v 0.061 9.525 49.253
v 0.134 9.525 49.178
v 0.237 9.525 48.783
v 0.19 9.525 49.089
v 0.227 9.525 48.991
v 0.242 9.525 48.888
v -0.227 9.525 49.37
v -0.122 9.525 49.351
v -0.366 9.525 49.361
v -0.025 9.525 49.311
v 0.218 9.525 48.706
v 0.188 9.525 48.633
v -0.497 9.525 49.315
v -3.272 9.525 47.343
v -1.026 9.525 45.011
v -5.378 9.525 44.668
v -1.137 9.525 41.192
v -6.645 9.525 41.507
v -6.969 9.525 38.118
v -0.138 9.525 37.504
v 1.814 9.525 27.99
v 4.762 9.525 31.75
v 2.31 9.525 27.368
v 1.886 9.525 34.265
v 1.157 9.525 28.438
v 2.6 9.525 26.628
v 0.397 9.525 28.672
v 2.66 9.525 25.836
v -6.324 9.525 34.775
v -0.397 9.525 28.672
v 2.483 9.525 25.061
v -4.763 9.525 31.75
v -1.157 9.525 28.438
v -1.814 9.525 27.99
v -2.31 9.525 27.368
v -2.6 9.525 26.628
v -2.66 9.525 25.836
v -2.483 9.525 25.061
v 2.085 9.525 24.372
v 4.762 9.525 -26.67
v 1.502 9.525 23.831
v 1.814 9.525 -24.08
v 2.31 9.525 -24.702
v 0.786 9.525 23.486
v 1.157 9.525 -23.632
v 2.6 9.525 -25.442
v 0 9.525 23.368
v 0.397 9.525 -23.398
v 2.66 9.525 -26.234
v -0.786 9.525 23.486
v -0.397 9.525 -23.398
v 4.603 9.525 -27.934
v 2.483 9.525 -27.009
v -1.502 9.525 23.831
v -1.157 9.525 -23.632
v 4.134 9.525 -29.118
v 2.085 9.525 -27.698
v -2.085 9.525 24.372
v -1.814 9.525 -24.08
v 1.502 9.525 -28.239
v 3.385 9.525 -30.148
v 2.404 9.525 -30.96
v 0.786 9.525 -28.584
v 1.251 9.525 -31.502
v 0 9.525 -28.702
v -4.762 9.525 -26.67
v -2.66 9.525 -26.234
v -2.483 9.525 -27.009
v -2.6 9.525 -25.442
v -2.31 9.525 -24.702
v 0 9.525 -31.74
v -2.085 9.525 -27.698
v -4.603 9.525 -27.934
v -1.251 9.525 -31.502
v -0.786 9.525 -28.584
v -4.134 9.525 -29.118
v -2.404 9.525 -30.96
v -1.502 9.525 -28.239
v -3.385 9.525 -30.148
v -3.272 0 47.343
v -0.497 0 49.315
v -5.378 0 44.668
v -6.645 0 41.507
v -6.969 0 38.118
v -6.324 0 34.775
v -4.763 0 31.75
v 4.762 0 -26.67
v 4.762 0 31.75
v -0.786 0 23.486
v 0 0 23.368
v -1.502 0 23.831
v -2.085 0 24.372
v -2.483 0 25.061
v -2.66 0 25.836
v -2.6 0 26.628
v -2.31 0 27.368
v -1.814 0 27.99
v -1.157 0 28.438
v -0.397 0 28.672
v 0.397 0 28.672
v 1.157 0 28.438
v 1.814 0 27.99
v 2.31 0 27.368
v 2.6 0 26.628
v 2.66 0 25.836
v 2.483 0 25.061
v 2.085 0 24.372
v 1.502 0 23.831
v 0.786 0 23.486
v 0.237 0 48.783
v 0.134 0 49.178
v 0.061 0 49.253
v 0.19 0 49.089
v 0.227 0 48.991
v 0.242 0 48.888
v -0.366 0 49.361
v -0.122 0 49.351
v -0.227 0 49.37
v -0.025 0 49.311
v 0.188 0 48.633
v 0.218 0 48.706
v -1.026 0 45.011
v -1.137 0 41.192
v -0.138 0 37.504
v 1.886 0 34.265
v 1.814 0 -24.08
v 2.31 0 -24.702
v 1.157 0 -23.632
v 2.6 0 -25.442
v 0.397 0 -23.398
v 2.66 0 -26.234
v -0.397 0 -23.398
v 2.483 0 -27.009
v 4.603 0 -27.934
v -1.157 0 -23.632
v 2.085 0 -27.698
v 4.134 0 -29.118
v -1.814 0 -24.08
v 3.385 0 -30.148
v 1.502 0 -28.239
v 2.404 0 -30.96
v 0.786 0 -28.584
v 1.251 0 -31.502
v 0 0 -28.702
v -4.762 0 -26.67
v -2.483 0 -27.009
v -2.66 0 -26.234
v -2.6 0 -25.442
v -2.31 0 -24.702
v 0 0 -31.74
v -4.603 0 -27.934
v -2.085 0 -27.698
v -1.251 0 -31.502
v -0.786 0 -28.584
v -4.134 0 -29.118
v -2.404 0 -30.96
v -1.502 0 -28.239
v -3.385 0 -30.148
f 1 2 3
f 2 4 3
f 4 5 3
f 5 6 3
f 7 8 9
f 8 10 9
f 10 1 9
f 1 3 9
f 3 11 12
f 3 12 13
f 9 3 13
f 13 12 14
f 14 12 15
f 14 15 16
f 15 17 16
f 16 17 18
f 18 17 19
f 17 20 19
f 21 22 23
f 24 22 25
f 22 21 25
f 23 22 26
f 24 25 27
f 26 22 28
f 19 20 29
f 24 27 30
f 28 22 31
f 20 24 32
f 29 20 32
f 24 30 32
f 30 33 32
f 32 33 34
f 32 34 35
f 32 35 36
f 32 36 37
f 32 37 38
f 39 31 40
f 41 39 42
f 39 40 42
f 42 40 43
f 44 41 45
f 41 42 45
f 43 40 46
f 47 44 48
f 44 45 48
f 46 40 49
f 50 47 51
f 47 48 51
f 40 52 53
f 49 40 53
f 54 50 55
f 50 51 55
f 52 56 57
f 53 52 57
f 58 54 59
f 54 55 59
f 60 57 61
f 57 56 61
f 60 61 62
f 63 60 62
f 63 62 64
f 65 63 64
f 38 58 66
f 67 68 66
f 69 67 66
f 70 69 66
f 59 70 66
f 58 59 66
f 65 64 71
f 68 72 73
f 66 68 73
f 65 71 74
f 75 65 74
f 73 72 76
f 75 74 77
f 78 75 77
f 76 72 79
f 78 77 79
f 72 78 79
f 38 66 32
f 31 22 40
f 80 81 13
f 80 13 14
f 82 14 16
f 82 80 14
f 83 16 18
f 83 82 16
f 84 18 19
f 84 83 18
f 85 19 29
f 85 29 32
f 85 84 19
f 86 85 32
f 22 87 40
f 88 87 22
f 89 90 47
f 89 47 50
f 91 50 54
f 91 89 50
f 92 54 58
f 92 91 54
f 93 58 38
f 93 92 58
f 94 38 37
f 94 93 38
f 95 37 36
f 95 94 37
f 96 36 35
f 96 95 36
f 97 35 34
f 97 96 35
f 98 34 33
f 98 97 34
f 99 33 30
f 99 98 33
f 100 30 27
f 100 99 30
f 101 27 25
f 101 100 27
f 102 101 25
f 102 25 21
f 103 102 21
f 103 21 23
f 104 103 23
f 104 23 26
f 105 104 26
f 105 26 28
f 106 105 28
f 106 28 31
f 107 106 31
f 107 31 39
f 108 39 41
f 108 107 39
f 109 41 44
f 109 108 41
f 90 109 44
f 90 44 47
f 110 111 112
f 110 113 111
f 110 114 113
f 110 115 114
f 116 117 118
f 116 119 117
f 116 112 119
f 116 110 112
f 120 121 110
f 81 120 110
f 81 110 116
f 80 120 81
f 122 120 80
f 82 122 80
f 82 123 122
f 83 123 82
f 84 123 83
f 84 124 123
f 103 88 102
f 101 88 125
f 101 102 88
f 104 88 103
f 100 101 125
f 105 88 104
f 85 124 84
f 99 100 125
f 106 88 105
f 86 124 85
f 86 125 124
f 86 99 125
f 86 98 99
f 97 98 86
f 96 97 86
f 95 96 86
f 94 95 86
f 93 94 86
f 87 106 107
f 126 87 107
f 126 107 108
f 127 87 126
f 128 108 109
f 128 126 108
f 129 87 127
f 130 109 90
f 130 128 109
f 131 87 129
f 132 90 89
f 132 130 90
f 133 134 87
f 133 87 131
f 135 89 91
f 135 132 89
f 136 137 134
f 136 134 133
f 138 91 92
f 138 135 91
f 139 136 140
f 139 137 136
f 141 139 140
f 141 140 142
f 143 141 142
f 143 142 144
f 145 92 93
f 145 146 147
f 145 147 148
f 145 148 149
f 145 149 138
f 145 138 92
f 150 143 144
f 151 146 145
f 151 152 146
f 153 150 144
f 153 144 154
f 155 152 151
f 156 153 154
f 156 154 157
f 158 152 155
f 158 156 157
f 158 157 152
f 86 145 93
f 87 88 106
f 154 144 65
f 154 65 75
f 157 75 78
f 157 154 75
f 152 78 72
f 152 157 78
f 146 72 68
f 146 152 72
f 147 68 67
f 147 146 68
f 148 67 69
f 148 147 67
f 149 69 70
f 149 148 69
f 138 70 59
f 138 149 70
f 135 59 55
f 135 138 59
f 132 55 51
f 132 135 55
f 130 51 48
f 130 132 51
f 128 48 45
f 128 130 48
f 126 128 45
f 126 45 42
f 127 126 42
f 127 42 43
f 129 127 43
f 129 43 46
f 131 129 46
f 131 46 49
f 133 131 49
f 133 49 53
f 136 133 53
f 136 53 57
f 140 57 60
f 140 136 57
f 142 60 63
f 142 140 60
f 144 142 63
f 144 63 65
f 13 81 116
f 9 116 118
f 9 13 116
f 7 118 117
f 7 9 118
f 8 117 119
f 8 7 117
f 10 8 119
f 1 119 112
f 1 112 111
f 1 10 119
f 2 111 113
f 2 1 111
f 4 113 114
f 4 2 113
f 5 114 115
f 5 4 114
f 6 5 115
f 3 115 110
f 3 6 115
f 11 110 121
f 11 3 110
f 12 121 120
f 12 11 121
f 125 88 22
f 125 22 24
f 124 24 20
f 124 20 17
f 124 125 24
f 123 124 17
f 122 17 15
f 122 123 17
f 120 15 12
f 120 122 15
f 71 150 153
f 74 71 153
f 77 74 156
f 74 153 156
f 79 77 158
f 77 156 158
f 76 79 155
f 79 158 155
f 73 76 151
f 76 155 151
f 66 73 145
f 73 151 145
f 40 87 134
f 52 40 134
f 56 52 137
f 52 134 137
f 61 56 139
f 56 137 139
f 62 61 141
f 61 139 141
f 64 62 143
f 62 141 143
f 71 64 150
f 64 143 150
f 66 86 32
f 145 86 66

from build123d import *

# Parameters (mm, degrees)
SKETCH1_R           = 2.667
BOSS_EXTRUDE1_DEPTH = 9.525
FILLET1_R           = 5.08
FILLET2_R           = 0.508


with BuildPart() as part:
    # Sketch1 → Boss-Extrude1 (new body)
    with BuildSketch(Plane(origin=(0, 0, 0), x_dir=(1, 0, 0), z_dir=(0, 1, 0))):
        with BuildLine():
            Line((-4.7625, 31.75), (4.7625, 31.75))
            Line((4.7625, 31.75), (4.7625, -31.75))
            ThreePointArc((4.7625, -31.75), (-0.950597142, -40.049292778), (0.9525, -49.943531548))
            ThreePointArc((0.9525, -49.943531548), (-6.432834073, -42.269060926), (-4.7625, -31.75))
            Line((-4.7625, -31.75), (-4.7625, 31.75))
        make_face()
        with Locations(Location((0, -26.035, 0), (0, 0, 90))):
            Circle(SKETCH1_R, mode=Mode.SUBTRACT)
        with Locations(Location((0, 26.035, 0), (0, 0, 90))):
            Circle(SKETCH1_R, mode=Mode.SUBTRACT)
    extrude(amount=BOSS_EXTRUDE1_DEPTH)

    # Fillet1
    # the kernel refuses this fillet: 5.08 mm, written as the material it takes off along each edge
    with BuildSketch(Plane(origin=(-4.7625, -12.7, -31.75), x_dir=(0, 0, 1), z_dir=(0, 1, 0)), Plane(origin=(4.7625, -12.7, -31.75), x_dir=(-1, 0, 0), z_dir=(0, 1, 0))) as fillet1_piece_1:
        with BuildLine():
            CenterArc((FILLET1_R, FILLET1_R), FILLET1_R, 180, 90)
            Line((0, FILLET1_R), (0, 0))
            Line((0, 0), (FILLET1_R, 0))
        make_face()
    extrude(amount=34.925, mode=Mode.SUBTRACT)

    # Fillet2
    fillet2_edges = [part.edges().sort_by_distance(p)[0] for p in [
        (0.9525, 4.7625, 49.943531548),
    ]]
    fillet(fillet2_edges, radius=FILLET2_R)


solid = part.part
